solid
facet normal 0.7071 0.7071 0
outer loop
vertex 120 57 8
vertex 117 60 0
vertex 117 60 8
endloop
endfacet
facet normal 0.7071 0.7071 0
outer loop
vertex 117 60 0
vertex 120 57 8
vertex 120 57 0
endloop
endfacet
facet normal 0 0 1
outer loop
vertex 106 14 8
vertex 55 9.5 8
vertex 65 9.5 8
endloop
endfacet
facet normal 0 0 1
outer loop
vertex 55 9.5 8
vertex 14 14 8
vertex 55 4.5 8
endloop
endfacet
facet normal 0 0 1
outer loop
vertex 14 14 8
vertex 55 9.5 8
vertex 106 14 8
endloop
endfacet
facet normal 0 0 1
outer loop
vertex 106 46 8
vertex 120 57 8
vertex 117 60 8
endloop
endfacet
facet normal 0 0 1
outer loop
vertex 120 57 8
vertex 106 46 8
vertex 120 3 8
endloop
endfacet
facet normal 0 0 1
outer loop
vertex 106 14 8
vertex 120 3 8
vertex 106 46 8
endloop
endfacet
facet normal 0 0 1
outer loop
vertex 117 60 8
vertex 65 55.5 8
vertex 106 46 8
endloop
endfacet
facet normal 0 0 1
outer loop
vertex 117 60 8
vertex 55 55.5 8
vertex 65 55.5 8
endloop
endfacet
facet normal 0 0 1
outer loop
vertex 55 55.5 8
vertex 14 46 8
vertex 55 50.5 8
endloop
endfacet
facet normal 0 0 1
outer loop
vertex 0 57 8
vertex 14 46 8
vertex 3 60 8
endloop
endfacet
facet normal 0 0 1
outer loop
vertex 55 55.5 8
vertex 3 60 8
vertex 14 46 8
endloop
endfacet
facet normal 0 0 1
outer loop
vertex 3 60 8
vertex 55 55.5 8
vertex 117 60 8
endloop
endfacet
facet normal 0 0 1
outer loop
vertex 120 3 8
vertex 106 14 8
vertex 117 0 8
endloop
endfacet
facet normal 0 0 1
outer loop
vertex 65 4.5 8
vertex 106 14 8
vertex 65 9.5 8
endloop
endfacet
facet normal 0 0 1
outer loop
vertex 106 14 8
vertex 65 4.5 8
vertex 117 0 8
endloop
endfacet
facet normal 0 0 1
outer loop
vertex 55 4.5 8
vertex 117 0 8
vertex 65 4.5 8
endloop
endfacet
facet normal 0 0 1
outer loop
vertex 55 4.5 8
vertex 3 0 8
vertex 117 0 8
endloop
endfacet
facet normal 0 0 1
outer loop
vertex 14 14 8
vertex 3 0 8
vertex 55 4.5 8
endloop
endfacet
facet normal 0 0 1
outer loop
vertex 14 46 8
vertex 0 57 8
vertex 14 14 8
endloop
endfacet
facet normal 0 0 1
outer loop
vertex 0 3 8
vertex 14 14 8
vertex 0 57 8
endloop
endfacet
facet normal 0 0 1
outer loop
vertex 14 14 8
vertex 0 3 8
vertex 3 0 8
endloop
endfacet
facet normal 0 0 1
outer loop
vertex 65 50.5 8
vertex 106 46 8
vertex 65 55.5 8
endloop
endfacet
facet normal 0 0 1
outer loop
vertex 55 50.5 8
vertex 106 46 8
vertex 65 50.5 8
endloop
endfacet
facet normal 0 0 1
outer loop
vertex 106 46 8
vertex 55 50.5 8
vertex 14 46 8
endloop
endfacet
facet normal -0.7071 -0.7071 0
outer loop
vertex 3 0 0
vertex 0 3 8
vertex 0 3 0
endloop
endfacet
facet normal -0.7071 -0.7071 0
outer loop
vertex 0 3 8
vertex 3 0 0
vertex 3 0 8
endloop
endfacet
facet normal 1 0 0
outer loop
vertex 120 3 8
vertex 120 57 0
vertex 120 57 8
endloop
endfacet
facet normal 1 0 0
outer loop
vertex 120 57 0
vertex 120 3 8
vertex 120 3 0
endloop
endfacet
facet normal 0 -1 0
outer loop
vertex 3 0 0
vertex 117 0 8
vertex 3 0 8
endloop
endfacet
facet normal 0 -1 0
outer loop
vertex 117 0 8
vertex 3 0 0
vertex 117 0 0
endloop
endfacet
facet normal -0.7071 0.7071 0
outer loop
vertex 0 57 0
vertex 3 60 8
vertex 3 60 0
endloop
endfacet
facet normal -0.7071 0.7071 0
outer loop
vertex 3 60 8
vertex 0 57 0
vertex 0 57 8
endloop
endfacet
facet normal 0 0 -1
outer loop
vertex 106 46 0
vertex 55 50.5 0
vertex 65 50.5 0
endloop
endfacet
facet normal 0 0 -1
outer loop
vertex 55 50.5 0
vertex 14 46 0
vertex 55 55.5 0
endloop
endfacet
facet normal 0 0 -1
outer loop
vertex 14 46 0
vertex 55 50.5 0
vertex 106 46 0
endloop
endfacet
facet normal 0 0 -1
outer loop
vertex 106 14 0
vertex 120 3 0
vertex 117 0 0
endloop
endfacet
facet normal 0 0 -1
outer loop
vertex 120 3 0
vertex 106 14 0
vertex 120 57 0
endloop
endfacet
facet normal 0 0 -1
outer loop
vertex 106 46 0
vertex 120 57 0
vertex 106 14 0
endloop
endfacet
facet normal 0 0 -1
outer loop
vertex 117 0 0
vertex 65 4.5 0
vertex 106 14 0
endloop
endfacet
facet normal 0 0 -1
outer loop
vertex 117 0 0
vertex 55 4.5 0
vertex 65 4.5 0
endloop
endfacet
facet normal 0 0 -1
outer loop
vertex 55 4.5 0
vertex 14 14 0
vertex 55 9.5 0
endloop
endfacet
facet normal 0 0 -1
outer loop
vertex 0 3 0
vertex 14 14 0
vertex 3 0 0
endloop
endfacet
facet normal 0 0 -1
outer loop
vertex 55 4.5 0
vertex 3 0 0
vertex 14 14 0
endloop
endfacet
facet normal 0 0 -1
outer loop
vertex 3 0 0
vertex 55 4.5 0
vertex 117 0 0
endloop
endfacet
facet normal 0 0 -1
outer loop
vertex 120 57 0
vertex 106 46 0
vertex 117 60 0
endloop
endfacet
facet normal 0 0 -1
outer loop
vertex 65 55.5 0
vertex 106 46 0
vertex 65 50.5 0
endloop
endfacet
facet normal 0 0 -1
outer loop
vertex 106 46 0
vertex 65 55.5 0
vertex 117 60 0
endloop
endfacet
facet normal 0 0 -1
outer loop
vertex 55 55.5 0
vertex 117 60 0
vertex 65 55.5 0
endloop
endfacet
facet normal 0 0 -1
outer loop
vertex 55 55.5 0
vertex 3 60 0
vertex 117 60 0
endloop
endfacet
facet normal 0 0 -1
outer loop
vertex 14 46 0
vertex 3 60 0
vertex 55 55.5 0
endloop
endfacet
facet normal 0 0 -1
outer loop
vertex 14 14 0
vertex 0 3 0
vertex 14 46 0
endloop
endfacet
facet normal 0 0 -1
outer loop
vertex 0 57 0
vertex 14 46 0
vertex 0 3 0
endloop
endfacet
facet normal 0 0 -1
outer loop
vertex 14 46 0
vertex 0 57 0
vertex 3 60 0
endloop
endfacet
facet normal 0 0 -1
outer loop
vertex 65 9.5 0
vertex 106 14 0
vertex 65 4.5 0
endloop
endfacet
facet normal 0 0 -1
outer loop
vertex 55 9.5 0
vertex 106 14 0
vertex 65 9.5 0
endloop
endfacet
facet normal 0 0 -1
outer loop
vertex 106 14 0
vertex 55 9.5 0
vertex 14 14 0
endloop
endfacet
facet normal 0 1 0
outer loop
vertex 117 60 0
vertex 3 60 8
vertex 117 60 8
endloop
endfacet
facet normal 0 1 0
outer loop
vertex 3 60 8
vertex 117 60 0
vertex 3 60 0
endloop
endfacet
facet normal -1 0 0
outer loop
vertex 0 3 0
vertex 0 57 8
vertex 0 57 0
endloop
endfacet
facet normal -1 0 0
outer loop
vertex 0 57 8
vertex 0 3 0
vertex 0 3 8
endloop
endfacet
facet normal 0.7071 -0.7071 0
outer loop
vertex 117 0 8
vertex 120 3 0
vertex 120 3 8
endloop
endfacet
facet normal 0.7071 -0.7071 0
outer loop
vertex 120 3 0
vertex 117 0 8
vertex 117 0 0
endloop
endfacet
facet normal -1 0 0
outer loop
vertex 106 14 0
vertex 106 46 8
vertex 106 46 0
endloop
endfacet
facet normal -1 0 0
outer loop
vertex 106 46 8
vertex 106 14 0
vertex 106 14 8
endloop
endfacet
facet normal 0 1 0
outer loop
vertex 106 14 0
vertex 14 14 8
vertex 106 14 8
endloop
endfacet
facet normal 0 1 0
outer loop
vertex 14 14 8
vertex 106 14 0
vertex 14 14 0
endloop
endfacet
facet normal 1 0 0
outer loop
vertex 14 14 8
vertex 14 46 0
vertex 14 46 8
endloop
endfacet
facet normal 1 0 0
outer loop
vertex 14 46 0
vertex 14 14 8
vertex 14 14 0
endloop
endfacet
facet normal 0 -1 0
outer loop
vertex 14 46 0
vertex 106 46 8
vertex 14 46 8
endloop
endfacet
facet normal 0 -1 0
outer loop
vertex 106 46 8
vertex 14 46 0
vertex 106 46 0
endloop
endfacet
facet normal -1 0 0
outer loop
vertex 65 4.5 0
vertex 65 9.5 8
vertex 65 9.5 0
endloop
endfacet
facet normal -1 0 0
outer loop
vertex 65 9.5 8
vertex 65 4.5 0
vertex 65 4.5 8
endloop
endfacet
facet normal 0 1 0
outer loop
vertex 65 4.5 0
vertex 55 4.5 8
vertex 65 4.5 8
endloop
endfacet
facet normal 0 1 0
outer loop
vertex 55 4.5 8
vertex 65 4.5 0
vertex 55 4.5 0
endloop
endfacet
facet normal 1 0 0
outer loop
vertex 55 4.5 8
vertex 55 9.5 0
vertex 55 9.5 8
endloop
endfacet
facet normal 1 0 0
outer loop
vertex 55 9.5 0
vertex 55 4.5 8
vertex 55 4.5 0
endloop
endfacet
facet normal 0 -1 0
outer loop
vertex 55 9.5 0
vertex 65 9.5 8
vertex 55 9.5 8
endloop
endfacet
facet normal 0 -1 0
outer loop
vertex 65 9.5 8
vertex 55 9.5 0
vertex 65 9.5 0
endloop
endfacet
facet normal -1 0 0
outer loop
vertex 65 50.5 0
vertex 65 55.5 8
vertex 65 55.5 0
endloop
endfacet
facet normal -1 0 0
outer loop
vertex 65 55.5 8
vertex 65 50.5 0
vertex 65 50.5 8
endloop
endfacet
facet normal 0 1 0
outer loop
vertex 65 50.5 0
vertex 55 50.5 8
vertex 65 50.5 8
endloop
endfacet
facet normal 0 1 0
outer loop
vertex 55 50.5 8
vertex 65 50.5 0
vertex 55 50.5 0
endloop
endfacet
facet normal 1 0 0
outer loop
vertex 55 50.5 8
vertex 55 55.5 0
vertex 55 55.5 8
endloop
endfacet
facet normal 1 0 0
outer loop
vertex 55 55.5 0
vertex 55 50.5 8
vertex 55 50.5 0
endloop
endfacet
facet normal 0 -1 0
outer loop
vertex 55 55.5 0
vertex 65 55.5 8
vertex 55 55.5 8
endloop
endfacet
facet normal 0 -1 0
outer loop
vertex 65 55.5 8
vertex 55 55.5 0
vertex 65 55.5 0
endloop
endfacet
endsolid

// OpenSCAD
$fn = 32;

// ----------------------------------------------------------------------
// Frame plate: 120 x 60 frame, 14 mm rails
// ----------------------------------------------------------------------

// --- parameters (mm) ---
plate_l = 120;            // plate length, X
plate_w = 60;             // plate width, Y
plate_t = 8;              // plate thickness, Z (extrusion height)
corner_c = 3;             // corner chamfer
frame_bar = 14;           // frame rail width
slot_l = 10;              // adjustment slot length
slot_w = 5;               // adjustment slot width

win_l = plate_l - 2 * frame_bar;  // window length
win_w = plate_w - 2 * frame_bar;  // window width

profile = [[3, 0], [117, 0], [120, 3], [120, 57], [117, 60], [3, 60], [0, 57], [0, 3]];  // primary outline, 8 points, counter clockwise
void_1 = [[14, 14], [106, 14], [106, 46], [14, 46]];  // the window, 4 points
void_2 = [[55, 4.5], [65, 4.5], [65, 9.5], [55, 9.5]];  // adjustment slot, 4 points
void_3 = [[55, 50.5], [65, 50.5], [65, 55.5], [55, 55.5]];  // adjustment slot, 4 points

// --- the one profile operation ---
difference() {
  linear_extrude(height = plate_t) polygon(points = profile);
  translate([0, 0, -1])
    linear_extrude(height = plate_t + 2) polygon(points = void_1);
  translate([0, 0, -1])
    linear_extrude(height = plate_t + 2) polygon(points = void_2);
  translate([0, 0, -1])
    linear_extrude(height = plate_t + 2) polygon(points = void_3);
}
